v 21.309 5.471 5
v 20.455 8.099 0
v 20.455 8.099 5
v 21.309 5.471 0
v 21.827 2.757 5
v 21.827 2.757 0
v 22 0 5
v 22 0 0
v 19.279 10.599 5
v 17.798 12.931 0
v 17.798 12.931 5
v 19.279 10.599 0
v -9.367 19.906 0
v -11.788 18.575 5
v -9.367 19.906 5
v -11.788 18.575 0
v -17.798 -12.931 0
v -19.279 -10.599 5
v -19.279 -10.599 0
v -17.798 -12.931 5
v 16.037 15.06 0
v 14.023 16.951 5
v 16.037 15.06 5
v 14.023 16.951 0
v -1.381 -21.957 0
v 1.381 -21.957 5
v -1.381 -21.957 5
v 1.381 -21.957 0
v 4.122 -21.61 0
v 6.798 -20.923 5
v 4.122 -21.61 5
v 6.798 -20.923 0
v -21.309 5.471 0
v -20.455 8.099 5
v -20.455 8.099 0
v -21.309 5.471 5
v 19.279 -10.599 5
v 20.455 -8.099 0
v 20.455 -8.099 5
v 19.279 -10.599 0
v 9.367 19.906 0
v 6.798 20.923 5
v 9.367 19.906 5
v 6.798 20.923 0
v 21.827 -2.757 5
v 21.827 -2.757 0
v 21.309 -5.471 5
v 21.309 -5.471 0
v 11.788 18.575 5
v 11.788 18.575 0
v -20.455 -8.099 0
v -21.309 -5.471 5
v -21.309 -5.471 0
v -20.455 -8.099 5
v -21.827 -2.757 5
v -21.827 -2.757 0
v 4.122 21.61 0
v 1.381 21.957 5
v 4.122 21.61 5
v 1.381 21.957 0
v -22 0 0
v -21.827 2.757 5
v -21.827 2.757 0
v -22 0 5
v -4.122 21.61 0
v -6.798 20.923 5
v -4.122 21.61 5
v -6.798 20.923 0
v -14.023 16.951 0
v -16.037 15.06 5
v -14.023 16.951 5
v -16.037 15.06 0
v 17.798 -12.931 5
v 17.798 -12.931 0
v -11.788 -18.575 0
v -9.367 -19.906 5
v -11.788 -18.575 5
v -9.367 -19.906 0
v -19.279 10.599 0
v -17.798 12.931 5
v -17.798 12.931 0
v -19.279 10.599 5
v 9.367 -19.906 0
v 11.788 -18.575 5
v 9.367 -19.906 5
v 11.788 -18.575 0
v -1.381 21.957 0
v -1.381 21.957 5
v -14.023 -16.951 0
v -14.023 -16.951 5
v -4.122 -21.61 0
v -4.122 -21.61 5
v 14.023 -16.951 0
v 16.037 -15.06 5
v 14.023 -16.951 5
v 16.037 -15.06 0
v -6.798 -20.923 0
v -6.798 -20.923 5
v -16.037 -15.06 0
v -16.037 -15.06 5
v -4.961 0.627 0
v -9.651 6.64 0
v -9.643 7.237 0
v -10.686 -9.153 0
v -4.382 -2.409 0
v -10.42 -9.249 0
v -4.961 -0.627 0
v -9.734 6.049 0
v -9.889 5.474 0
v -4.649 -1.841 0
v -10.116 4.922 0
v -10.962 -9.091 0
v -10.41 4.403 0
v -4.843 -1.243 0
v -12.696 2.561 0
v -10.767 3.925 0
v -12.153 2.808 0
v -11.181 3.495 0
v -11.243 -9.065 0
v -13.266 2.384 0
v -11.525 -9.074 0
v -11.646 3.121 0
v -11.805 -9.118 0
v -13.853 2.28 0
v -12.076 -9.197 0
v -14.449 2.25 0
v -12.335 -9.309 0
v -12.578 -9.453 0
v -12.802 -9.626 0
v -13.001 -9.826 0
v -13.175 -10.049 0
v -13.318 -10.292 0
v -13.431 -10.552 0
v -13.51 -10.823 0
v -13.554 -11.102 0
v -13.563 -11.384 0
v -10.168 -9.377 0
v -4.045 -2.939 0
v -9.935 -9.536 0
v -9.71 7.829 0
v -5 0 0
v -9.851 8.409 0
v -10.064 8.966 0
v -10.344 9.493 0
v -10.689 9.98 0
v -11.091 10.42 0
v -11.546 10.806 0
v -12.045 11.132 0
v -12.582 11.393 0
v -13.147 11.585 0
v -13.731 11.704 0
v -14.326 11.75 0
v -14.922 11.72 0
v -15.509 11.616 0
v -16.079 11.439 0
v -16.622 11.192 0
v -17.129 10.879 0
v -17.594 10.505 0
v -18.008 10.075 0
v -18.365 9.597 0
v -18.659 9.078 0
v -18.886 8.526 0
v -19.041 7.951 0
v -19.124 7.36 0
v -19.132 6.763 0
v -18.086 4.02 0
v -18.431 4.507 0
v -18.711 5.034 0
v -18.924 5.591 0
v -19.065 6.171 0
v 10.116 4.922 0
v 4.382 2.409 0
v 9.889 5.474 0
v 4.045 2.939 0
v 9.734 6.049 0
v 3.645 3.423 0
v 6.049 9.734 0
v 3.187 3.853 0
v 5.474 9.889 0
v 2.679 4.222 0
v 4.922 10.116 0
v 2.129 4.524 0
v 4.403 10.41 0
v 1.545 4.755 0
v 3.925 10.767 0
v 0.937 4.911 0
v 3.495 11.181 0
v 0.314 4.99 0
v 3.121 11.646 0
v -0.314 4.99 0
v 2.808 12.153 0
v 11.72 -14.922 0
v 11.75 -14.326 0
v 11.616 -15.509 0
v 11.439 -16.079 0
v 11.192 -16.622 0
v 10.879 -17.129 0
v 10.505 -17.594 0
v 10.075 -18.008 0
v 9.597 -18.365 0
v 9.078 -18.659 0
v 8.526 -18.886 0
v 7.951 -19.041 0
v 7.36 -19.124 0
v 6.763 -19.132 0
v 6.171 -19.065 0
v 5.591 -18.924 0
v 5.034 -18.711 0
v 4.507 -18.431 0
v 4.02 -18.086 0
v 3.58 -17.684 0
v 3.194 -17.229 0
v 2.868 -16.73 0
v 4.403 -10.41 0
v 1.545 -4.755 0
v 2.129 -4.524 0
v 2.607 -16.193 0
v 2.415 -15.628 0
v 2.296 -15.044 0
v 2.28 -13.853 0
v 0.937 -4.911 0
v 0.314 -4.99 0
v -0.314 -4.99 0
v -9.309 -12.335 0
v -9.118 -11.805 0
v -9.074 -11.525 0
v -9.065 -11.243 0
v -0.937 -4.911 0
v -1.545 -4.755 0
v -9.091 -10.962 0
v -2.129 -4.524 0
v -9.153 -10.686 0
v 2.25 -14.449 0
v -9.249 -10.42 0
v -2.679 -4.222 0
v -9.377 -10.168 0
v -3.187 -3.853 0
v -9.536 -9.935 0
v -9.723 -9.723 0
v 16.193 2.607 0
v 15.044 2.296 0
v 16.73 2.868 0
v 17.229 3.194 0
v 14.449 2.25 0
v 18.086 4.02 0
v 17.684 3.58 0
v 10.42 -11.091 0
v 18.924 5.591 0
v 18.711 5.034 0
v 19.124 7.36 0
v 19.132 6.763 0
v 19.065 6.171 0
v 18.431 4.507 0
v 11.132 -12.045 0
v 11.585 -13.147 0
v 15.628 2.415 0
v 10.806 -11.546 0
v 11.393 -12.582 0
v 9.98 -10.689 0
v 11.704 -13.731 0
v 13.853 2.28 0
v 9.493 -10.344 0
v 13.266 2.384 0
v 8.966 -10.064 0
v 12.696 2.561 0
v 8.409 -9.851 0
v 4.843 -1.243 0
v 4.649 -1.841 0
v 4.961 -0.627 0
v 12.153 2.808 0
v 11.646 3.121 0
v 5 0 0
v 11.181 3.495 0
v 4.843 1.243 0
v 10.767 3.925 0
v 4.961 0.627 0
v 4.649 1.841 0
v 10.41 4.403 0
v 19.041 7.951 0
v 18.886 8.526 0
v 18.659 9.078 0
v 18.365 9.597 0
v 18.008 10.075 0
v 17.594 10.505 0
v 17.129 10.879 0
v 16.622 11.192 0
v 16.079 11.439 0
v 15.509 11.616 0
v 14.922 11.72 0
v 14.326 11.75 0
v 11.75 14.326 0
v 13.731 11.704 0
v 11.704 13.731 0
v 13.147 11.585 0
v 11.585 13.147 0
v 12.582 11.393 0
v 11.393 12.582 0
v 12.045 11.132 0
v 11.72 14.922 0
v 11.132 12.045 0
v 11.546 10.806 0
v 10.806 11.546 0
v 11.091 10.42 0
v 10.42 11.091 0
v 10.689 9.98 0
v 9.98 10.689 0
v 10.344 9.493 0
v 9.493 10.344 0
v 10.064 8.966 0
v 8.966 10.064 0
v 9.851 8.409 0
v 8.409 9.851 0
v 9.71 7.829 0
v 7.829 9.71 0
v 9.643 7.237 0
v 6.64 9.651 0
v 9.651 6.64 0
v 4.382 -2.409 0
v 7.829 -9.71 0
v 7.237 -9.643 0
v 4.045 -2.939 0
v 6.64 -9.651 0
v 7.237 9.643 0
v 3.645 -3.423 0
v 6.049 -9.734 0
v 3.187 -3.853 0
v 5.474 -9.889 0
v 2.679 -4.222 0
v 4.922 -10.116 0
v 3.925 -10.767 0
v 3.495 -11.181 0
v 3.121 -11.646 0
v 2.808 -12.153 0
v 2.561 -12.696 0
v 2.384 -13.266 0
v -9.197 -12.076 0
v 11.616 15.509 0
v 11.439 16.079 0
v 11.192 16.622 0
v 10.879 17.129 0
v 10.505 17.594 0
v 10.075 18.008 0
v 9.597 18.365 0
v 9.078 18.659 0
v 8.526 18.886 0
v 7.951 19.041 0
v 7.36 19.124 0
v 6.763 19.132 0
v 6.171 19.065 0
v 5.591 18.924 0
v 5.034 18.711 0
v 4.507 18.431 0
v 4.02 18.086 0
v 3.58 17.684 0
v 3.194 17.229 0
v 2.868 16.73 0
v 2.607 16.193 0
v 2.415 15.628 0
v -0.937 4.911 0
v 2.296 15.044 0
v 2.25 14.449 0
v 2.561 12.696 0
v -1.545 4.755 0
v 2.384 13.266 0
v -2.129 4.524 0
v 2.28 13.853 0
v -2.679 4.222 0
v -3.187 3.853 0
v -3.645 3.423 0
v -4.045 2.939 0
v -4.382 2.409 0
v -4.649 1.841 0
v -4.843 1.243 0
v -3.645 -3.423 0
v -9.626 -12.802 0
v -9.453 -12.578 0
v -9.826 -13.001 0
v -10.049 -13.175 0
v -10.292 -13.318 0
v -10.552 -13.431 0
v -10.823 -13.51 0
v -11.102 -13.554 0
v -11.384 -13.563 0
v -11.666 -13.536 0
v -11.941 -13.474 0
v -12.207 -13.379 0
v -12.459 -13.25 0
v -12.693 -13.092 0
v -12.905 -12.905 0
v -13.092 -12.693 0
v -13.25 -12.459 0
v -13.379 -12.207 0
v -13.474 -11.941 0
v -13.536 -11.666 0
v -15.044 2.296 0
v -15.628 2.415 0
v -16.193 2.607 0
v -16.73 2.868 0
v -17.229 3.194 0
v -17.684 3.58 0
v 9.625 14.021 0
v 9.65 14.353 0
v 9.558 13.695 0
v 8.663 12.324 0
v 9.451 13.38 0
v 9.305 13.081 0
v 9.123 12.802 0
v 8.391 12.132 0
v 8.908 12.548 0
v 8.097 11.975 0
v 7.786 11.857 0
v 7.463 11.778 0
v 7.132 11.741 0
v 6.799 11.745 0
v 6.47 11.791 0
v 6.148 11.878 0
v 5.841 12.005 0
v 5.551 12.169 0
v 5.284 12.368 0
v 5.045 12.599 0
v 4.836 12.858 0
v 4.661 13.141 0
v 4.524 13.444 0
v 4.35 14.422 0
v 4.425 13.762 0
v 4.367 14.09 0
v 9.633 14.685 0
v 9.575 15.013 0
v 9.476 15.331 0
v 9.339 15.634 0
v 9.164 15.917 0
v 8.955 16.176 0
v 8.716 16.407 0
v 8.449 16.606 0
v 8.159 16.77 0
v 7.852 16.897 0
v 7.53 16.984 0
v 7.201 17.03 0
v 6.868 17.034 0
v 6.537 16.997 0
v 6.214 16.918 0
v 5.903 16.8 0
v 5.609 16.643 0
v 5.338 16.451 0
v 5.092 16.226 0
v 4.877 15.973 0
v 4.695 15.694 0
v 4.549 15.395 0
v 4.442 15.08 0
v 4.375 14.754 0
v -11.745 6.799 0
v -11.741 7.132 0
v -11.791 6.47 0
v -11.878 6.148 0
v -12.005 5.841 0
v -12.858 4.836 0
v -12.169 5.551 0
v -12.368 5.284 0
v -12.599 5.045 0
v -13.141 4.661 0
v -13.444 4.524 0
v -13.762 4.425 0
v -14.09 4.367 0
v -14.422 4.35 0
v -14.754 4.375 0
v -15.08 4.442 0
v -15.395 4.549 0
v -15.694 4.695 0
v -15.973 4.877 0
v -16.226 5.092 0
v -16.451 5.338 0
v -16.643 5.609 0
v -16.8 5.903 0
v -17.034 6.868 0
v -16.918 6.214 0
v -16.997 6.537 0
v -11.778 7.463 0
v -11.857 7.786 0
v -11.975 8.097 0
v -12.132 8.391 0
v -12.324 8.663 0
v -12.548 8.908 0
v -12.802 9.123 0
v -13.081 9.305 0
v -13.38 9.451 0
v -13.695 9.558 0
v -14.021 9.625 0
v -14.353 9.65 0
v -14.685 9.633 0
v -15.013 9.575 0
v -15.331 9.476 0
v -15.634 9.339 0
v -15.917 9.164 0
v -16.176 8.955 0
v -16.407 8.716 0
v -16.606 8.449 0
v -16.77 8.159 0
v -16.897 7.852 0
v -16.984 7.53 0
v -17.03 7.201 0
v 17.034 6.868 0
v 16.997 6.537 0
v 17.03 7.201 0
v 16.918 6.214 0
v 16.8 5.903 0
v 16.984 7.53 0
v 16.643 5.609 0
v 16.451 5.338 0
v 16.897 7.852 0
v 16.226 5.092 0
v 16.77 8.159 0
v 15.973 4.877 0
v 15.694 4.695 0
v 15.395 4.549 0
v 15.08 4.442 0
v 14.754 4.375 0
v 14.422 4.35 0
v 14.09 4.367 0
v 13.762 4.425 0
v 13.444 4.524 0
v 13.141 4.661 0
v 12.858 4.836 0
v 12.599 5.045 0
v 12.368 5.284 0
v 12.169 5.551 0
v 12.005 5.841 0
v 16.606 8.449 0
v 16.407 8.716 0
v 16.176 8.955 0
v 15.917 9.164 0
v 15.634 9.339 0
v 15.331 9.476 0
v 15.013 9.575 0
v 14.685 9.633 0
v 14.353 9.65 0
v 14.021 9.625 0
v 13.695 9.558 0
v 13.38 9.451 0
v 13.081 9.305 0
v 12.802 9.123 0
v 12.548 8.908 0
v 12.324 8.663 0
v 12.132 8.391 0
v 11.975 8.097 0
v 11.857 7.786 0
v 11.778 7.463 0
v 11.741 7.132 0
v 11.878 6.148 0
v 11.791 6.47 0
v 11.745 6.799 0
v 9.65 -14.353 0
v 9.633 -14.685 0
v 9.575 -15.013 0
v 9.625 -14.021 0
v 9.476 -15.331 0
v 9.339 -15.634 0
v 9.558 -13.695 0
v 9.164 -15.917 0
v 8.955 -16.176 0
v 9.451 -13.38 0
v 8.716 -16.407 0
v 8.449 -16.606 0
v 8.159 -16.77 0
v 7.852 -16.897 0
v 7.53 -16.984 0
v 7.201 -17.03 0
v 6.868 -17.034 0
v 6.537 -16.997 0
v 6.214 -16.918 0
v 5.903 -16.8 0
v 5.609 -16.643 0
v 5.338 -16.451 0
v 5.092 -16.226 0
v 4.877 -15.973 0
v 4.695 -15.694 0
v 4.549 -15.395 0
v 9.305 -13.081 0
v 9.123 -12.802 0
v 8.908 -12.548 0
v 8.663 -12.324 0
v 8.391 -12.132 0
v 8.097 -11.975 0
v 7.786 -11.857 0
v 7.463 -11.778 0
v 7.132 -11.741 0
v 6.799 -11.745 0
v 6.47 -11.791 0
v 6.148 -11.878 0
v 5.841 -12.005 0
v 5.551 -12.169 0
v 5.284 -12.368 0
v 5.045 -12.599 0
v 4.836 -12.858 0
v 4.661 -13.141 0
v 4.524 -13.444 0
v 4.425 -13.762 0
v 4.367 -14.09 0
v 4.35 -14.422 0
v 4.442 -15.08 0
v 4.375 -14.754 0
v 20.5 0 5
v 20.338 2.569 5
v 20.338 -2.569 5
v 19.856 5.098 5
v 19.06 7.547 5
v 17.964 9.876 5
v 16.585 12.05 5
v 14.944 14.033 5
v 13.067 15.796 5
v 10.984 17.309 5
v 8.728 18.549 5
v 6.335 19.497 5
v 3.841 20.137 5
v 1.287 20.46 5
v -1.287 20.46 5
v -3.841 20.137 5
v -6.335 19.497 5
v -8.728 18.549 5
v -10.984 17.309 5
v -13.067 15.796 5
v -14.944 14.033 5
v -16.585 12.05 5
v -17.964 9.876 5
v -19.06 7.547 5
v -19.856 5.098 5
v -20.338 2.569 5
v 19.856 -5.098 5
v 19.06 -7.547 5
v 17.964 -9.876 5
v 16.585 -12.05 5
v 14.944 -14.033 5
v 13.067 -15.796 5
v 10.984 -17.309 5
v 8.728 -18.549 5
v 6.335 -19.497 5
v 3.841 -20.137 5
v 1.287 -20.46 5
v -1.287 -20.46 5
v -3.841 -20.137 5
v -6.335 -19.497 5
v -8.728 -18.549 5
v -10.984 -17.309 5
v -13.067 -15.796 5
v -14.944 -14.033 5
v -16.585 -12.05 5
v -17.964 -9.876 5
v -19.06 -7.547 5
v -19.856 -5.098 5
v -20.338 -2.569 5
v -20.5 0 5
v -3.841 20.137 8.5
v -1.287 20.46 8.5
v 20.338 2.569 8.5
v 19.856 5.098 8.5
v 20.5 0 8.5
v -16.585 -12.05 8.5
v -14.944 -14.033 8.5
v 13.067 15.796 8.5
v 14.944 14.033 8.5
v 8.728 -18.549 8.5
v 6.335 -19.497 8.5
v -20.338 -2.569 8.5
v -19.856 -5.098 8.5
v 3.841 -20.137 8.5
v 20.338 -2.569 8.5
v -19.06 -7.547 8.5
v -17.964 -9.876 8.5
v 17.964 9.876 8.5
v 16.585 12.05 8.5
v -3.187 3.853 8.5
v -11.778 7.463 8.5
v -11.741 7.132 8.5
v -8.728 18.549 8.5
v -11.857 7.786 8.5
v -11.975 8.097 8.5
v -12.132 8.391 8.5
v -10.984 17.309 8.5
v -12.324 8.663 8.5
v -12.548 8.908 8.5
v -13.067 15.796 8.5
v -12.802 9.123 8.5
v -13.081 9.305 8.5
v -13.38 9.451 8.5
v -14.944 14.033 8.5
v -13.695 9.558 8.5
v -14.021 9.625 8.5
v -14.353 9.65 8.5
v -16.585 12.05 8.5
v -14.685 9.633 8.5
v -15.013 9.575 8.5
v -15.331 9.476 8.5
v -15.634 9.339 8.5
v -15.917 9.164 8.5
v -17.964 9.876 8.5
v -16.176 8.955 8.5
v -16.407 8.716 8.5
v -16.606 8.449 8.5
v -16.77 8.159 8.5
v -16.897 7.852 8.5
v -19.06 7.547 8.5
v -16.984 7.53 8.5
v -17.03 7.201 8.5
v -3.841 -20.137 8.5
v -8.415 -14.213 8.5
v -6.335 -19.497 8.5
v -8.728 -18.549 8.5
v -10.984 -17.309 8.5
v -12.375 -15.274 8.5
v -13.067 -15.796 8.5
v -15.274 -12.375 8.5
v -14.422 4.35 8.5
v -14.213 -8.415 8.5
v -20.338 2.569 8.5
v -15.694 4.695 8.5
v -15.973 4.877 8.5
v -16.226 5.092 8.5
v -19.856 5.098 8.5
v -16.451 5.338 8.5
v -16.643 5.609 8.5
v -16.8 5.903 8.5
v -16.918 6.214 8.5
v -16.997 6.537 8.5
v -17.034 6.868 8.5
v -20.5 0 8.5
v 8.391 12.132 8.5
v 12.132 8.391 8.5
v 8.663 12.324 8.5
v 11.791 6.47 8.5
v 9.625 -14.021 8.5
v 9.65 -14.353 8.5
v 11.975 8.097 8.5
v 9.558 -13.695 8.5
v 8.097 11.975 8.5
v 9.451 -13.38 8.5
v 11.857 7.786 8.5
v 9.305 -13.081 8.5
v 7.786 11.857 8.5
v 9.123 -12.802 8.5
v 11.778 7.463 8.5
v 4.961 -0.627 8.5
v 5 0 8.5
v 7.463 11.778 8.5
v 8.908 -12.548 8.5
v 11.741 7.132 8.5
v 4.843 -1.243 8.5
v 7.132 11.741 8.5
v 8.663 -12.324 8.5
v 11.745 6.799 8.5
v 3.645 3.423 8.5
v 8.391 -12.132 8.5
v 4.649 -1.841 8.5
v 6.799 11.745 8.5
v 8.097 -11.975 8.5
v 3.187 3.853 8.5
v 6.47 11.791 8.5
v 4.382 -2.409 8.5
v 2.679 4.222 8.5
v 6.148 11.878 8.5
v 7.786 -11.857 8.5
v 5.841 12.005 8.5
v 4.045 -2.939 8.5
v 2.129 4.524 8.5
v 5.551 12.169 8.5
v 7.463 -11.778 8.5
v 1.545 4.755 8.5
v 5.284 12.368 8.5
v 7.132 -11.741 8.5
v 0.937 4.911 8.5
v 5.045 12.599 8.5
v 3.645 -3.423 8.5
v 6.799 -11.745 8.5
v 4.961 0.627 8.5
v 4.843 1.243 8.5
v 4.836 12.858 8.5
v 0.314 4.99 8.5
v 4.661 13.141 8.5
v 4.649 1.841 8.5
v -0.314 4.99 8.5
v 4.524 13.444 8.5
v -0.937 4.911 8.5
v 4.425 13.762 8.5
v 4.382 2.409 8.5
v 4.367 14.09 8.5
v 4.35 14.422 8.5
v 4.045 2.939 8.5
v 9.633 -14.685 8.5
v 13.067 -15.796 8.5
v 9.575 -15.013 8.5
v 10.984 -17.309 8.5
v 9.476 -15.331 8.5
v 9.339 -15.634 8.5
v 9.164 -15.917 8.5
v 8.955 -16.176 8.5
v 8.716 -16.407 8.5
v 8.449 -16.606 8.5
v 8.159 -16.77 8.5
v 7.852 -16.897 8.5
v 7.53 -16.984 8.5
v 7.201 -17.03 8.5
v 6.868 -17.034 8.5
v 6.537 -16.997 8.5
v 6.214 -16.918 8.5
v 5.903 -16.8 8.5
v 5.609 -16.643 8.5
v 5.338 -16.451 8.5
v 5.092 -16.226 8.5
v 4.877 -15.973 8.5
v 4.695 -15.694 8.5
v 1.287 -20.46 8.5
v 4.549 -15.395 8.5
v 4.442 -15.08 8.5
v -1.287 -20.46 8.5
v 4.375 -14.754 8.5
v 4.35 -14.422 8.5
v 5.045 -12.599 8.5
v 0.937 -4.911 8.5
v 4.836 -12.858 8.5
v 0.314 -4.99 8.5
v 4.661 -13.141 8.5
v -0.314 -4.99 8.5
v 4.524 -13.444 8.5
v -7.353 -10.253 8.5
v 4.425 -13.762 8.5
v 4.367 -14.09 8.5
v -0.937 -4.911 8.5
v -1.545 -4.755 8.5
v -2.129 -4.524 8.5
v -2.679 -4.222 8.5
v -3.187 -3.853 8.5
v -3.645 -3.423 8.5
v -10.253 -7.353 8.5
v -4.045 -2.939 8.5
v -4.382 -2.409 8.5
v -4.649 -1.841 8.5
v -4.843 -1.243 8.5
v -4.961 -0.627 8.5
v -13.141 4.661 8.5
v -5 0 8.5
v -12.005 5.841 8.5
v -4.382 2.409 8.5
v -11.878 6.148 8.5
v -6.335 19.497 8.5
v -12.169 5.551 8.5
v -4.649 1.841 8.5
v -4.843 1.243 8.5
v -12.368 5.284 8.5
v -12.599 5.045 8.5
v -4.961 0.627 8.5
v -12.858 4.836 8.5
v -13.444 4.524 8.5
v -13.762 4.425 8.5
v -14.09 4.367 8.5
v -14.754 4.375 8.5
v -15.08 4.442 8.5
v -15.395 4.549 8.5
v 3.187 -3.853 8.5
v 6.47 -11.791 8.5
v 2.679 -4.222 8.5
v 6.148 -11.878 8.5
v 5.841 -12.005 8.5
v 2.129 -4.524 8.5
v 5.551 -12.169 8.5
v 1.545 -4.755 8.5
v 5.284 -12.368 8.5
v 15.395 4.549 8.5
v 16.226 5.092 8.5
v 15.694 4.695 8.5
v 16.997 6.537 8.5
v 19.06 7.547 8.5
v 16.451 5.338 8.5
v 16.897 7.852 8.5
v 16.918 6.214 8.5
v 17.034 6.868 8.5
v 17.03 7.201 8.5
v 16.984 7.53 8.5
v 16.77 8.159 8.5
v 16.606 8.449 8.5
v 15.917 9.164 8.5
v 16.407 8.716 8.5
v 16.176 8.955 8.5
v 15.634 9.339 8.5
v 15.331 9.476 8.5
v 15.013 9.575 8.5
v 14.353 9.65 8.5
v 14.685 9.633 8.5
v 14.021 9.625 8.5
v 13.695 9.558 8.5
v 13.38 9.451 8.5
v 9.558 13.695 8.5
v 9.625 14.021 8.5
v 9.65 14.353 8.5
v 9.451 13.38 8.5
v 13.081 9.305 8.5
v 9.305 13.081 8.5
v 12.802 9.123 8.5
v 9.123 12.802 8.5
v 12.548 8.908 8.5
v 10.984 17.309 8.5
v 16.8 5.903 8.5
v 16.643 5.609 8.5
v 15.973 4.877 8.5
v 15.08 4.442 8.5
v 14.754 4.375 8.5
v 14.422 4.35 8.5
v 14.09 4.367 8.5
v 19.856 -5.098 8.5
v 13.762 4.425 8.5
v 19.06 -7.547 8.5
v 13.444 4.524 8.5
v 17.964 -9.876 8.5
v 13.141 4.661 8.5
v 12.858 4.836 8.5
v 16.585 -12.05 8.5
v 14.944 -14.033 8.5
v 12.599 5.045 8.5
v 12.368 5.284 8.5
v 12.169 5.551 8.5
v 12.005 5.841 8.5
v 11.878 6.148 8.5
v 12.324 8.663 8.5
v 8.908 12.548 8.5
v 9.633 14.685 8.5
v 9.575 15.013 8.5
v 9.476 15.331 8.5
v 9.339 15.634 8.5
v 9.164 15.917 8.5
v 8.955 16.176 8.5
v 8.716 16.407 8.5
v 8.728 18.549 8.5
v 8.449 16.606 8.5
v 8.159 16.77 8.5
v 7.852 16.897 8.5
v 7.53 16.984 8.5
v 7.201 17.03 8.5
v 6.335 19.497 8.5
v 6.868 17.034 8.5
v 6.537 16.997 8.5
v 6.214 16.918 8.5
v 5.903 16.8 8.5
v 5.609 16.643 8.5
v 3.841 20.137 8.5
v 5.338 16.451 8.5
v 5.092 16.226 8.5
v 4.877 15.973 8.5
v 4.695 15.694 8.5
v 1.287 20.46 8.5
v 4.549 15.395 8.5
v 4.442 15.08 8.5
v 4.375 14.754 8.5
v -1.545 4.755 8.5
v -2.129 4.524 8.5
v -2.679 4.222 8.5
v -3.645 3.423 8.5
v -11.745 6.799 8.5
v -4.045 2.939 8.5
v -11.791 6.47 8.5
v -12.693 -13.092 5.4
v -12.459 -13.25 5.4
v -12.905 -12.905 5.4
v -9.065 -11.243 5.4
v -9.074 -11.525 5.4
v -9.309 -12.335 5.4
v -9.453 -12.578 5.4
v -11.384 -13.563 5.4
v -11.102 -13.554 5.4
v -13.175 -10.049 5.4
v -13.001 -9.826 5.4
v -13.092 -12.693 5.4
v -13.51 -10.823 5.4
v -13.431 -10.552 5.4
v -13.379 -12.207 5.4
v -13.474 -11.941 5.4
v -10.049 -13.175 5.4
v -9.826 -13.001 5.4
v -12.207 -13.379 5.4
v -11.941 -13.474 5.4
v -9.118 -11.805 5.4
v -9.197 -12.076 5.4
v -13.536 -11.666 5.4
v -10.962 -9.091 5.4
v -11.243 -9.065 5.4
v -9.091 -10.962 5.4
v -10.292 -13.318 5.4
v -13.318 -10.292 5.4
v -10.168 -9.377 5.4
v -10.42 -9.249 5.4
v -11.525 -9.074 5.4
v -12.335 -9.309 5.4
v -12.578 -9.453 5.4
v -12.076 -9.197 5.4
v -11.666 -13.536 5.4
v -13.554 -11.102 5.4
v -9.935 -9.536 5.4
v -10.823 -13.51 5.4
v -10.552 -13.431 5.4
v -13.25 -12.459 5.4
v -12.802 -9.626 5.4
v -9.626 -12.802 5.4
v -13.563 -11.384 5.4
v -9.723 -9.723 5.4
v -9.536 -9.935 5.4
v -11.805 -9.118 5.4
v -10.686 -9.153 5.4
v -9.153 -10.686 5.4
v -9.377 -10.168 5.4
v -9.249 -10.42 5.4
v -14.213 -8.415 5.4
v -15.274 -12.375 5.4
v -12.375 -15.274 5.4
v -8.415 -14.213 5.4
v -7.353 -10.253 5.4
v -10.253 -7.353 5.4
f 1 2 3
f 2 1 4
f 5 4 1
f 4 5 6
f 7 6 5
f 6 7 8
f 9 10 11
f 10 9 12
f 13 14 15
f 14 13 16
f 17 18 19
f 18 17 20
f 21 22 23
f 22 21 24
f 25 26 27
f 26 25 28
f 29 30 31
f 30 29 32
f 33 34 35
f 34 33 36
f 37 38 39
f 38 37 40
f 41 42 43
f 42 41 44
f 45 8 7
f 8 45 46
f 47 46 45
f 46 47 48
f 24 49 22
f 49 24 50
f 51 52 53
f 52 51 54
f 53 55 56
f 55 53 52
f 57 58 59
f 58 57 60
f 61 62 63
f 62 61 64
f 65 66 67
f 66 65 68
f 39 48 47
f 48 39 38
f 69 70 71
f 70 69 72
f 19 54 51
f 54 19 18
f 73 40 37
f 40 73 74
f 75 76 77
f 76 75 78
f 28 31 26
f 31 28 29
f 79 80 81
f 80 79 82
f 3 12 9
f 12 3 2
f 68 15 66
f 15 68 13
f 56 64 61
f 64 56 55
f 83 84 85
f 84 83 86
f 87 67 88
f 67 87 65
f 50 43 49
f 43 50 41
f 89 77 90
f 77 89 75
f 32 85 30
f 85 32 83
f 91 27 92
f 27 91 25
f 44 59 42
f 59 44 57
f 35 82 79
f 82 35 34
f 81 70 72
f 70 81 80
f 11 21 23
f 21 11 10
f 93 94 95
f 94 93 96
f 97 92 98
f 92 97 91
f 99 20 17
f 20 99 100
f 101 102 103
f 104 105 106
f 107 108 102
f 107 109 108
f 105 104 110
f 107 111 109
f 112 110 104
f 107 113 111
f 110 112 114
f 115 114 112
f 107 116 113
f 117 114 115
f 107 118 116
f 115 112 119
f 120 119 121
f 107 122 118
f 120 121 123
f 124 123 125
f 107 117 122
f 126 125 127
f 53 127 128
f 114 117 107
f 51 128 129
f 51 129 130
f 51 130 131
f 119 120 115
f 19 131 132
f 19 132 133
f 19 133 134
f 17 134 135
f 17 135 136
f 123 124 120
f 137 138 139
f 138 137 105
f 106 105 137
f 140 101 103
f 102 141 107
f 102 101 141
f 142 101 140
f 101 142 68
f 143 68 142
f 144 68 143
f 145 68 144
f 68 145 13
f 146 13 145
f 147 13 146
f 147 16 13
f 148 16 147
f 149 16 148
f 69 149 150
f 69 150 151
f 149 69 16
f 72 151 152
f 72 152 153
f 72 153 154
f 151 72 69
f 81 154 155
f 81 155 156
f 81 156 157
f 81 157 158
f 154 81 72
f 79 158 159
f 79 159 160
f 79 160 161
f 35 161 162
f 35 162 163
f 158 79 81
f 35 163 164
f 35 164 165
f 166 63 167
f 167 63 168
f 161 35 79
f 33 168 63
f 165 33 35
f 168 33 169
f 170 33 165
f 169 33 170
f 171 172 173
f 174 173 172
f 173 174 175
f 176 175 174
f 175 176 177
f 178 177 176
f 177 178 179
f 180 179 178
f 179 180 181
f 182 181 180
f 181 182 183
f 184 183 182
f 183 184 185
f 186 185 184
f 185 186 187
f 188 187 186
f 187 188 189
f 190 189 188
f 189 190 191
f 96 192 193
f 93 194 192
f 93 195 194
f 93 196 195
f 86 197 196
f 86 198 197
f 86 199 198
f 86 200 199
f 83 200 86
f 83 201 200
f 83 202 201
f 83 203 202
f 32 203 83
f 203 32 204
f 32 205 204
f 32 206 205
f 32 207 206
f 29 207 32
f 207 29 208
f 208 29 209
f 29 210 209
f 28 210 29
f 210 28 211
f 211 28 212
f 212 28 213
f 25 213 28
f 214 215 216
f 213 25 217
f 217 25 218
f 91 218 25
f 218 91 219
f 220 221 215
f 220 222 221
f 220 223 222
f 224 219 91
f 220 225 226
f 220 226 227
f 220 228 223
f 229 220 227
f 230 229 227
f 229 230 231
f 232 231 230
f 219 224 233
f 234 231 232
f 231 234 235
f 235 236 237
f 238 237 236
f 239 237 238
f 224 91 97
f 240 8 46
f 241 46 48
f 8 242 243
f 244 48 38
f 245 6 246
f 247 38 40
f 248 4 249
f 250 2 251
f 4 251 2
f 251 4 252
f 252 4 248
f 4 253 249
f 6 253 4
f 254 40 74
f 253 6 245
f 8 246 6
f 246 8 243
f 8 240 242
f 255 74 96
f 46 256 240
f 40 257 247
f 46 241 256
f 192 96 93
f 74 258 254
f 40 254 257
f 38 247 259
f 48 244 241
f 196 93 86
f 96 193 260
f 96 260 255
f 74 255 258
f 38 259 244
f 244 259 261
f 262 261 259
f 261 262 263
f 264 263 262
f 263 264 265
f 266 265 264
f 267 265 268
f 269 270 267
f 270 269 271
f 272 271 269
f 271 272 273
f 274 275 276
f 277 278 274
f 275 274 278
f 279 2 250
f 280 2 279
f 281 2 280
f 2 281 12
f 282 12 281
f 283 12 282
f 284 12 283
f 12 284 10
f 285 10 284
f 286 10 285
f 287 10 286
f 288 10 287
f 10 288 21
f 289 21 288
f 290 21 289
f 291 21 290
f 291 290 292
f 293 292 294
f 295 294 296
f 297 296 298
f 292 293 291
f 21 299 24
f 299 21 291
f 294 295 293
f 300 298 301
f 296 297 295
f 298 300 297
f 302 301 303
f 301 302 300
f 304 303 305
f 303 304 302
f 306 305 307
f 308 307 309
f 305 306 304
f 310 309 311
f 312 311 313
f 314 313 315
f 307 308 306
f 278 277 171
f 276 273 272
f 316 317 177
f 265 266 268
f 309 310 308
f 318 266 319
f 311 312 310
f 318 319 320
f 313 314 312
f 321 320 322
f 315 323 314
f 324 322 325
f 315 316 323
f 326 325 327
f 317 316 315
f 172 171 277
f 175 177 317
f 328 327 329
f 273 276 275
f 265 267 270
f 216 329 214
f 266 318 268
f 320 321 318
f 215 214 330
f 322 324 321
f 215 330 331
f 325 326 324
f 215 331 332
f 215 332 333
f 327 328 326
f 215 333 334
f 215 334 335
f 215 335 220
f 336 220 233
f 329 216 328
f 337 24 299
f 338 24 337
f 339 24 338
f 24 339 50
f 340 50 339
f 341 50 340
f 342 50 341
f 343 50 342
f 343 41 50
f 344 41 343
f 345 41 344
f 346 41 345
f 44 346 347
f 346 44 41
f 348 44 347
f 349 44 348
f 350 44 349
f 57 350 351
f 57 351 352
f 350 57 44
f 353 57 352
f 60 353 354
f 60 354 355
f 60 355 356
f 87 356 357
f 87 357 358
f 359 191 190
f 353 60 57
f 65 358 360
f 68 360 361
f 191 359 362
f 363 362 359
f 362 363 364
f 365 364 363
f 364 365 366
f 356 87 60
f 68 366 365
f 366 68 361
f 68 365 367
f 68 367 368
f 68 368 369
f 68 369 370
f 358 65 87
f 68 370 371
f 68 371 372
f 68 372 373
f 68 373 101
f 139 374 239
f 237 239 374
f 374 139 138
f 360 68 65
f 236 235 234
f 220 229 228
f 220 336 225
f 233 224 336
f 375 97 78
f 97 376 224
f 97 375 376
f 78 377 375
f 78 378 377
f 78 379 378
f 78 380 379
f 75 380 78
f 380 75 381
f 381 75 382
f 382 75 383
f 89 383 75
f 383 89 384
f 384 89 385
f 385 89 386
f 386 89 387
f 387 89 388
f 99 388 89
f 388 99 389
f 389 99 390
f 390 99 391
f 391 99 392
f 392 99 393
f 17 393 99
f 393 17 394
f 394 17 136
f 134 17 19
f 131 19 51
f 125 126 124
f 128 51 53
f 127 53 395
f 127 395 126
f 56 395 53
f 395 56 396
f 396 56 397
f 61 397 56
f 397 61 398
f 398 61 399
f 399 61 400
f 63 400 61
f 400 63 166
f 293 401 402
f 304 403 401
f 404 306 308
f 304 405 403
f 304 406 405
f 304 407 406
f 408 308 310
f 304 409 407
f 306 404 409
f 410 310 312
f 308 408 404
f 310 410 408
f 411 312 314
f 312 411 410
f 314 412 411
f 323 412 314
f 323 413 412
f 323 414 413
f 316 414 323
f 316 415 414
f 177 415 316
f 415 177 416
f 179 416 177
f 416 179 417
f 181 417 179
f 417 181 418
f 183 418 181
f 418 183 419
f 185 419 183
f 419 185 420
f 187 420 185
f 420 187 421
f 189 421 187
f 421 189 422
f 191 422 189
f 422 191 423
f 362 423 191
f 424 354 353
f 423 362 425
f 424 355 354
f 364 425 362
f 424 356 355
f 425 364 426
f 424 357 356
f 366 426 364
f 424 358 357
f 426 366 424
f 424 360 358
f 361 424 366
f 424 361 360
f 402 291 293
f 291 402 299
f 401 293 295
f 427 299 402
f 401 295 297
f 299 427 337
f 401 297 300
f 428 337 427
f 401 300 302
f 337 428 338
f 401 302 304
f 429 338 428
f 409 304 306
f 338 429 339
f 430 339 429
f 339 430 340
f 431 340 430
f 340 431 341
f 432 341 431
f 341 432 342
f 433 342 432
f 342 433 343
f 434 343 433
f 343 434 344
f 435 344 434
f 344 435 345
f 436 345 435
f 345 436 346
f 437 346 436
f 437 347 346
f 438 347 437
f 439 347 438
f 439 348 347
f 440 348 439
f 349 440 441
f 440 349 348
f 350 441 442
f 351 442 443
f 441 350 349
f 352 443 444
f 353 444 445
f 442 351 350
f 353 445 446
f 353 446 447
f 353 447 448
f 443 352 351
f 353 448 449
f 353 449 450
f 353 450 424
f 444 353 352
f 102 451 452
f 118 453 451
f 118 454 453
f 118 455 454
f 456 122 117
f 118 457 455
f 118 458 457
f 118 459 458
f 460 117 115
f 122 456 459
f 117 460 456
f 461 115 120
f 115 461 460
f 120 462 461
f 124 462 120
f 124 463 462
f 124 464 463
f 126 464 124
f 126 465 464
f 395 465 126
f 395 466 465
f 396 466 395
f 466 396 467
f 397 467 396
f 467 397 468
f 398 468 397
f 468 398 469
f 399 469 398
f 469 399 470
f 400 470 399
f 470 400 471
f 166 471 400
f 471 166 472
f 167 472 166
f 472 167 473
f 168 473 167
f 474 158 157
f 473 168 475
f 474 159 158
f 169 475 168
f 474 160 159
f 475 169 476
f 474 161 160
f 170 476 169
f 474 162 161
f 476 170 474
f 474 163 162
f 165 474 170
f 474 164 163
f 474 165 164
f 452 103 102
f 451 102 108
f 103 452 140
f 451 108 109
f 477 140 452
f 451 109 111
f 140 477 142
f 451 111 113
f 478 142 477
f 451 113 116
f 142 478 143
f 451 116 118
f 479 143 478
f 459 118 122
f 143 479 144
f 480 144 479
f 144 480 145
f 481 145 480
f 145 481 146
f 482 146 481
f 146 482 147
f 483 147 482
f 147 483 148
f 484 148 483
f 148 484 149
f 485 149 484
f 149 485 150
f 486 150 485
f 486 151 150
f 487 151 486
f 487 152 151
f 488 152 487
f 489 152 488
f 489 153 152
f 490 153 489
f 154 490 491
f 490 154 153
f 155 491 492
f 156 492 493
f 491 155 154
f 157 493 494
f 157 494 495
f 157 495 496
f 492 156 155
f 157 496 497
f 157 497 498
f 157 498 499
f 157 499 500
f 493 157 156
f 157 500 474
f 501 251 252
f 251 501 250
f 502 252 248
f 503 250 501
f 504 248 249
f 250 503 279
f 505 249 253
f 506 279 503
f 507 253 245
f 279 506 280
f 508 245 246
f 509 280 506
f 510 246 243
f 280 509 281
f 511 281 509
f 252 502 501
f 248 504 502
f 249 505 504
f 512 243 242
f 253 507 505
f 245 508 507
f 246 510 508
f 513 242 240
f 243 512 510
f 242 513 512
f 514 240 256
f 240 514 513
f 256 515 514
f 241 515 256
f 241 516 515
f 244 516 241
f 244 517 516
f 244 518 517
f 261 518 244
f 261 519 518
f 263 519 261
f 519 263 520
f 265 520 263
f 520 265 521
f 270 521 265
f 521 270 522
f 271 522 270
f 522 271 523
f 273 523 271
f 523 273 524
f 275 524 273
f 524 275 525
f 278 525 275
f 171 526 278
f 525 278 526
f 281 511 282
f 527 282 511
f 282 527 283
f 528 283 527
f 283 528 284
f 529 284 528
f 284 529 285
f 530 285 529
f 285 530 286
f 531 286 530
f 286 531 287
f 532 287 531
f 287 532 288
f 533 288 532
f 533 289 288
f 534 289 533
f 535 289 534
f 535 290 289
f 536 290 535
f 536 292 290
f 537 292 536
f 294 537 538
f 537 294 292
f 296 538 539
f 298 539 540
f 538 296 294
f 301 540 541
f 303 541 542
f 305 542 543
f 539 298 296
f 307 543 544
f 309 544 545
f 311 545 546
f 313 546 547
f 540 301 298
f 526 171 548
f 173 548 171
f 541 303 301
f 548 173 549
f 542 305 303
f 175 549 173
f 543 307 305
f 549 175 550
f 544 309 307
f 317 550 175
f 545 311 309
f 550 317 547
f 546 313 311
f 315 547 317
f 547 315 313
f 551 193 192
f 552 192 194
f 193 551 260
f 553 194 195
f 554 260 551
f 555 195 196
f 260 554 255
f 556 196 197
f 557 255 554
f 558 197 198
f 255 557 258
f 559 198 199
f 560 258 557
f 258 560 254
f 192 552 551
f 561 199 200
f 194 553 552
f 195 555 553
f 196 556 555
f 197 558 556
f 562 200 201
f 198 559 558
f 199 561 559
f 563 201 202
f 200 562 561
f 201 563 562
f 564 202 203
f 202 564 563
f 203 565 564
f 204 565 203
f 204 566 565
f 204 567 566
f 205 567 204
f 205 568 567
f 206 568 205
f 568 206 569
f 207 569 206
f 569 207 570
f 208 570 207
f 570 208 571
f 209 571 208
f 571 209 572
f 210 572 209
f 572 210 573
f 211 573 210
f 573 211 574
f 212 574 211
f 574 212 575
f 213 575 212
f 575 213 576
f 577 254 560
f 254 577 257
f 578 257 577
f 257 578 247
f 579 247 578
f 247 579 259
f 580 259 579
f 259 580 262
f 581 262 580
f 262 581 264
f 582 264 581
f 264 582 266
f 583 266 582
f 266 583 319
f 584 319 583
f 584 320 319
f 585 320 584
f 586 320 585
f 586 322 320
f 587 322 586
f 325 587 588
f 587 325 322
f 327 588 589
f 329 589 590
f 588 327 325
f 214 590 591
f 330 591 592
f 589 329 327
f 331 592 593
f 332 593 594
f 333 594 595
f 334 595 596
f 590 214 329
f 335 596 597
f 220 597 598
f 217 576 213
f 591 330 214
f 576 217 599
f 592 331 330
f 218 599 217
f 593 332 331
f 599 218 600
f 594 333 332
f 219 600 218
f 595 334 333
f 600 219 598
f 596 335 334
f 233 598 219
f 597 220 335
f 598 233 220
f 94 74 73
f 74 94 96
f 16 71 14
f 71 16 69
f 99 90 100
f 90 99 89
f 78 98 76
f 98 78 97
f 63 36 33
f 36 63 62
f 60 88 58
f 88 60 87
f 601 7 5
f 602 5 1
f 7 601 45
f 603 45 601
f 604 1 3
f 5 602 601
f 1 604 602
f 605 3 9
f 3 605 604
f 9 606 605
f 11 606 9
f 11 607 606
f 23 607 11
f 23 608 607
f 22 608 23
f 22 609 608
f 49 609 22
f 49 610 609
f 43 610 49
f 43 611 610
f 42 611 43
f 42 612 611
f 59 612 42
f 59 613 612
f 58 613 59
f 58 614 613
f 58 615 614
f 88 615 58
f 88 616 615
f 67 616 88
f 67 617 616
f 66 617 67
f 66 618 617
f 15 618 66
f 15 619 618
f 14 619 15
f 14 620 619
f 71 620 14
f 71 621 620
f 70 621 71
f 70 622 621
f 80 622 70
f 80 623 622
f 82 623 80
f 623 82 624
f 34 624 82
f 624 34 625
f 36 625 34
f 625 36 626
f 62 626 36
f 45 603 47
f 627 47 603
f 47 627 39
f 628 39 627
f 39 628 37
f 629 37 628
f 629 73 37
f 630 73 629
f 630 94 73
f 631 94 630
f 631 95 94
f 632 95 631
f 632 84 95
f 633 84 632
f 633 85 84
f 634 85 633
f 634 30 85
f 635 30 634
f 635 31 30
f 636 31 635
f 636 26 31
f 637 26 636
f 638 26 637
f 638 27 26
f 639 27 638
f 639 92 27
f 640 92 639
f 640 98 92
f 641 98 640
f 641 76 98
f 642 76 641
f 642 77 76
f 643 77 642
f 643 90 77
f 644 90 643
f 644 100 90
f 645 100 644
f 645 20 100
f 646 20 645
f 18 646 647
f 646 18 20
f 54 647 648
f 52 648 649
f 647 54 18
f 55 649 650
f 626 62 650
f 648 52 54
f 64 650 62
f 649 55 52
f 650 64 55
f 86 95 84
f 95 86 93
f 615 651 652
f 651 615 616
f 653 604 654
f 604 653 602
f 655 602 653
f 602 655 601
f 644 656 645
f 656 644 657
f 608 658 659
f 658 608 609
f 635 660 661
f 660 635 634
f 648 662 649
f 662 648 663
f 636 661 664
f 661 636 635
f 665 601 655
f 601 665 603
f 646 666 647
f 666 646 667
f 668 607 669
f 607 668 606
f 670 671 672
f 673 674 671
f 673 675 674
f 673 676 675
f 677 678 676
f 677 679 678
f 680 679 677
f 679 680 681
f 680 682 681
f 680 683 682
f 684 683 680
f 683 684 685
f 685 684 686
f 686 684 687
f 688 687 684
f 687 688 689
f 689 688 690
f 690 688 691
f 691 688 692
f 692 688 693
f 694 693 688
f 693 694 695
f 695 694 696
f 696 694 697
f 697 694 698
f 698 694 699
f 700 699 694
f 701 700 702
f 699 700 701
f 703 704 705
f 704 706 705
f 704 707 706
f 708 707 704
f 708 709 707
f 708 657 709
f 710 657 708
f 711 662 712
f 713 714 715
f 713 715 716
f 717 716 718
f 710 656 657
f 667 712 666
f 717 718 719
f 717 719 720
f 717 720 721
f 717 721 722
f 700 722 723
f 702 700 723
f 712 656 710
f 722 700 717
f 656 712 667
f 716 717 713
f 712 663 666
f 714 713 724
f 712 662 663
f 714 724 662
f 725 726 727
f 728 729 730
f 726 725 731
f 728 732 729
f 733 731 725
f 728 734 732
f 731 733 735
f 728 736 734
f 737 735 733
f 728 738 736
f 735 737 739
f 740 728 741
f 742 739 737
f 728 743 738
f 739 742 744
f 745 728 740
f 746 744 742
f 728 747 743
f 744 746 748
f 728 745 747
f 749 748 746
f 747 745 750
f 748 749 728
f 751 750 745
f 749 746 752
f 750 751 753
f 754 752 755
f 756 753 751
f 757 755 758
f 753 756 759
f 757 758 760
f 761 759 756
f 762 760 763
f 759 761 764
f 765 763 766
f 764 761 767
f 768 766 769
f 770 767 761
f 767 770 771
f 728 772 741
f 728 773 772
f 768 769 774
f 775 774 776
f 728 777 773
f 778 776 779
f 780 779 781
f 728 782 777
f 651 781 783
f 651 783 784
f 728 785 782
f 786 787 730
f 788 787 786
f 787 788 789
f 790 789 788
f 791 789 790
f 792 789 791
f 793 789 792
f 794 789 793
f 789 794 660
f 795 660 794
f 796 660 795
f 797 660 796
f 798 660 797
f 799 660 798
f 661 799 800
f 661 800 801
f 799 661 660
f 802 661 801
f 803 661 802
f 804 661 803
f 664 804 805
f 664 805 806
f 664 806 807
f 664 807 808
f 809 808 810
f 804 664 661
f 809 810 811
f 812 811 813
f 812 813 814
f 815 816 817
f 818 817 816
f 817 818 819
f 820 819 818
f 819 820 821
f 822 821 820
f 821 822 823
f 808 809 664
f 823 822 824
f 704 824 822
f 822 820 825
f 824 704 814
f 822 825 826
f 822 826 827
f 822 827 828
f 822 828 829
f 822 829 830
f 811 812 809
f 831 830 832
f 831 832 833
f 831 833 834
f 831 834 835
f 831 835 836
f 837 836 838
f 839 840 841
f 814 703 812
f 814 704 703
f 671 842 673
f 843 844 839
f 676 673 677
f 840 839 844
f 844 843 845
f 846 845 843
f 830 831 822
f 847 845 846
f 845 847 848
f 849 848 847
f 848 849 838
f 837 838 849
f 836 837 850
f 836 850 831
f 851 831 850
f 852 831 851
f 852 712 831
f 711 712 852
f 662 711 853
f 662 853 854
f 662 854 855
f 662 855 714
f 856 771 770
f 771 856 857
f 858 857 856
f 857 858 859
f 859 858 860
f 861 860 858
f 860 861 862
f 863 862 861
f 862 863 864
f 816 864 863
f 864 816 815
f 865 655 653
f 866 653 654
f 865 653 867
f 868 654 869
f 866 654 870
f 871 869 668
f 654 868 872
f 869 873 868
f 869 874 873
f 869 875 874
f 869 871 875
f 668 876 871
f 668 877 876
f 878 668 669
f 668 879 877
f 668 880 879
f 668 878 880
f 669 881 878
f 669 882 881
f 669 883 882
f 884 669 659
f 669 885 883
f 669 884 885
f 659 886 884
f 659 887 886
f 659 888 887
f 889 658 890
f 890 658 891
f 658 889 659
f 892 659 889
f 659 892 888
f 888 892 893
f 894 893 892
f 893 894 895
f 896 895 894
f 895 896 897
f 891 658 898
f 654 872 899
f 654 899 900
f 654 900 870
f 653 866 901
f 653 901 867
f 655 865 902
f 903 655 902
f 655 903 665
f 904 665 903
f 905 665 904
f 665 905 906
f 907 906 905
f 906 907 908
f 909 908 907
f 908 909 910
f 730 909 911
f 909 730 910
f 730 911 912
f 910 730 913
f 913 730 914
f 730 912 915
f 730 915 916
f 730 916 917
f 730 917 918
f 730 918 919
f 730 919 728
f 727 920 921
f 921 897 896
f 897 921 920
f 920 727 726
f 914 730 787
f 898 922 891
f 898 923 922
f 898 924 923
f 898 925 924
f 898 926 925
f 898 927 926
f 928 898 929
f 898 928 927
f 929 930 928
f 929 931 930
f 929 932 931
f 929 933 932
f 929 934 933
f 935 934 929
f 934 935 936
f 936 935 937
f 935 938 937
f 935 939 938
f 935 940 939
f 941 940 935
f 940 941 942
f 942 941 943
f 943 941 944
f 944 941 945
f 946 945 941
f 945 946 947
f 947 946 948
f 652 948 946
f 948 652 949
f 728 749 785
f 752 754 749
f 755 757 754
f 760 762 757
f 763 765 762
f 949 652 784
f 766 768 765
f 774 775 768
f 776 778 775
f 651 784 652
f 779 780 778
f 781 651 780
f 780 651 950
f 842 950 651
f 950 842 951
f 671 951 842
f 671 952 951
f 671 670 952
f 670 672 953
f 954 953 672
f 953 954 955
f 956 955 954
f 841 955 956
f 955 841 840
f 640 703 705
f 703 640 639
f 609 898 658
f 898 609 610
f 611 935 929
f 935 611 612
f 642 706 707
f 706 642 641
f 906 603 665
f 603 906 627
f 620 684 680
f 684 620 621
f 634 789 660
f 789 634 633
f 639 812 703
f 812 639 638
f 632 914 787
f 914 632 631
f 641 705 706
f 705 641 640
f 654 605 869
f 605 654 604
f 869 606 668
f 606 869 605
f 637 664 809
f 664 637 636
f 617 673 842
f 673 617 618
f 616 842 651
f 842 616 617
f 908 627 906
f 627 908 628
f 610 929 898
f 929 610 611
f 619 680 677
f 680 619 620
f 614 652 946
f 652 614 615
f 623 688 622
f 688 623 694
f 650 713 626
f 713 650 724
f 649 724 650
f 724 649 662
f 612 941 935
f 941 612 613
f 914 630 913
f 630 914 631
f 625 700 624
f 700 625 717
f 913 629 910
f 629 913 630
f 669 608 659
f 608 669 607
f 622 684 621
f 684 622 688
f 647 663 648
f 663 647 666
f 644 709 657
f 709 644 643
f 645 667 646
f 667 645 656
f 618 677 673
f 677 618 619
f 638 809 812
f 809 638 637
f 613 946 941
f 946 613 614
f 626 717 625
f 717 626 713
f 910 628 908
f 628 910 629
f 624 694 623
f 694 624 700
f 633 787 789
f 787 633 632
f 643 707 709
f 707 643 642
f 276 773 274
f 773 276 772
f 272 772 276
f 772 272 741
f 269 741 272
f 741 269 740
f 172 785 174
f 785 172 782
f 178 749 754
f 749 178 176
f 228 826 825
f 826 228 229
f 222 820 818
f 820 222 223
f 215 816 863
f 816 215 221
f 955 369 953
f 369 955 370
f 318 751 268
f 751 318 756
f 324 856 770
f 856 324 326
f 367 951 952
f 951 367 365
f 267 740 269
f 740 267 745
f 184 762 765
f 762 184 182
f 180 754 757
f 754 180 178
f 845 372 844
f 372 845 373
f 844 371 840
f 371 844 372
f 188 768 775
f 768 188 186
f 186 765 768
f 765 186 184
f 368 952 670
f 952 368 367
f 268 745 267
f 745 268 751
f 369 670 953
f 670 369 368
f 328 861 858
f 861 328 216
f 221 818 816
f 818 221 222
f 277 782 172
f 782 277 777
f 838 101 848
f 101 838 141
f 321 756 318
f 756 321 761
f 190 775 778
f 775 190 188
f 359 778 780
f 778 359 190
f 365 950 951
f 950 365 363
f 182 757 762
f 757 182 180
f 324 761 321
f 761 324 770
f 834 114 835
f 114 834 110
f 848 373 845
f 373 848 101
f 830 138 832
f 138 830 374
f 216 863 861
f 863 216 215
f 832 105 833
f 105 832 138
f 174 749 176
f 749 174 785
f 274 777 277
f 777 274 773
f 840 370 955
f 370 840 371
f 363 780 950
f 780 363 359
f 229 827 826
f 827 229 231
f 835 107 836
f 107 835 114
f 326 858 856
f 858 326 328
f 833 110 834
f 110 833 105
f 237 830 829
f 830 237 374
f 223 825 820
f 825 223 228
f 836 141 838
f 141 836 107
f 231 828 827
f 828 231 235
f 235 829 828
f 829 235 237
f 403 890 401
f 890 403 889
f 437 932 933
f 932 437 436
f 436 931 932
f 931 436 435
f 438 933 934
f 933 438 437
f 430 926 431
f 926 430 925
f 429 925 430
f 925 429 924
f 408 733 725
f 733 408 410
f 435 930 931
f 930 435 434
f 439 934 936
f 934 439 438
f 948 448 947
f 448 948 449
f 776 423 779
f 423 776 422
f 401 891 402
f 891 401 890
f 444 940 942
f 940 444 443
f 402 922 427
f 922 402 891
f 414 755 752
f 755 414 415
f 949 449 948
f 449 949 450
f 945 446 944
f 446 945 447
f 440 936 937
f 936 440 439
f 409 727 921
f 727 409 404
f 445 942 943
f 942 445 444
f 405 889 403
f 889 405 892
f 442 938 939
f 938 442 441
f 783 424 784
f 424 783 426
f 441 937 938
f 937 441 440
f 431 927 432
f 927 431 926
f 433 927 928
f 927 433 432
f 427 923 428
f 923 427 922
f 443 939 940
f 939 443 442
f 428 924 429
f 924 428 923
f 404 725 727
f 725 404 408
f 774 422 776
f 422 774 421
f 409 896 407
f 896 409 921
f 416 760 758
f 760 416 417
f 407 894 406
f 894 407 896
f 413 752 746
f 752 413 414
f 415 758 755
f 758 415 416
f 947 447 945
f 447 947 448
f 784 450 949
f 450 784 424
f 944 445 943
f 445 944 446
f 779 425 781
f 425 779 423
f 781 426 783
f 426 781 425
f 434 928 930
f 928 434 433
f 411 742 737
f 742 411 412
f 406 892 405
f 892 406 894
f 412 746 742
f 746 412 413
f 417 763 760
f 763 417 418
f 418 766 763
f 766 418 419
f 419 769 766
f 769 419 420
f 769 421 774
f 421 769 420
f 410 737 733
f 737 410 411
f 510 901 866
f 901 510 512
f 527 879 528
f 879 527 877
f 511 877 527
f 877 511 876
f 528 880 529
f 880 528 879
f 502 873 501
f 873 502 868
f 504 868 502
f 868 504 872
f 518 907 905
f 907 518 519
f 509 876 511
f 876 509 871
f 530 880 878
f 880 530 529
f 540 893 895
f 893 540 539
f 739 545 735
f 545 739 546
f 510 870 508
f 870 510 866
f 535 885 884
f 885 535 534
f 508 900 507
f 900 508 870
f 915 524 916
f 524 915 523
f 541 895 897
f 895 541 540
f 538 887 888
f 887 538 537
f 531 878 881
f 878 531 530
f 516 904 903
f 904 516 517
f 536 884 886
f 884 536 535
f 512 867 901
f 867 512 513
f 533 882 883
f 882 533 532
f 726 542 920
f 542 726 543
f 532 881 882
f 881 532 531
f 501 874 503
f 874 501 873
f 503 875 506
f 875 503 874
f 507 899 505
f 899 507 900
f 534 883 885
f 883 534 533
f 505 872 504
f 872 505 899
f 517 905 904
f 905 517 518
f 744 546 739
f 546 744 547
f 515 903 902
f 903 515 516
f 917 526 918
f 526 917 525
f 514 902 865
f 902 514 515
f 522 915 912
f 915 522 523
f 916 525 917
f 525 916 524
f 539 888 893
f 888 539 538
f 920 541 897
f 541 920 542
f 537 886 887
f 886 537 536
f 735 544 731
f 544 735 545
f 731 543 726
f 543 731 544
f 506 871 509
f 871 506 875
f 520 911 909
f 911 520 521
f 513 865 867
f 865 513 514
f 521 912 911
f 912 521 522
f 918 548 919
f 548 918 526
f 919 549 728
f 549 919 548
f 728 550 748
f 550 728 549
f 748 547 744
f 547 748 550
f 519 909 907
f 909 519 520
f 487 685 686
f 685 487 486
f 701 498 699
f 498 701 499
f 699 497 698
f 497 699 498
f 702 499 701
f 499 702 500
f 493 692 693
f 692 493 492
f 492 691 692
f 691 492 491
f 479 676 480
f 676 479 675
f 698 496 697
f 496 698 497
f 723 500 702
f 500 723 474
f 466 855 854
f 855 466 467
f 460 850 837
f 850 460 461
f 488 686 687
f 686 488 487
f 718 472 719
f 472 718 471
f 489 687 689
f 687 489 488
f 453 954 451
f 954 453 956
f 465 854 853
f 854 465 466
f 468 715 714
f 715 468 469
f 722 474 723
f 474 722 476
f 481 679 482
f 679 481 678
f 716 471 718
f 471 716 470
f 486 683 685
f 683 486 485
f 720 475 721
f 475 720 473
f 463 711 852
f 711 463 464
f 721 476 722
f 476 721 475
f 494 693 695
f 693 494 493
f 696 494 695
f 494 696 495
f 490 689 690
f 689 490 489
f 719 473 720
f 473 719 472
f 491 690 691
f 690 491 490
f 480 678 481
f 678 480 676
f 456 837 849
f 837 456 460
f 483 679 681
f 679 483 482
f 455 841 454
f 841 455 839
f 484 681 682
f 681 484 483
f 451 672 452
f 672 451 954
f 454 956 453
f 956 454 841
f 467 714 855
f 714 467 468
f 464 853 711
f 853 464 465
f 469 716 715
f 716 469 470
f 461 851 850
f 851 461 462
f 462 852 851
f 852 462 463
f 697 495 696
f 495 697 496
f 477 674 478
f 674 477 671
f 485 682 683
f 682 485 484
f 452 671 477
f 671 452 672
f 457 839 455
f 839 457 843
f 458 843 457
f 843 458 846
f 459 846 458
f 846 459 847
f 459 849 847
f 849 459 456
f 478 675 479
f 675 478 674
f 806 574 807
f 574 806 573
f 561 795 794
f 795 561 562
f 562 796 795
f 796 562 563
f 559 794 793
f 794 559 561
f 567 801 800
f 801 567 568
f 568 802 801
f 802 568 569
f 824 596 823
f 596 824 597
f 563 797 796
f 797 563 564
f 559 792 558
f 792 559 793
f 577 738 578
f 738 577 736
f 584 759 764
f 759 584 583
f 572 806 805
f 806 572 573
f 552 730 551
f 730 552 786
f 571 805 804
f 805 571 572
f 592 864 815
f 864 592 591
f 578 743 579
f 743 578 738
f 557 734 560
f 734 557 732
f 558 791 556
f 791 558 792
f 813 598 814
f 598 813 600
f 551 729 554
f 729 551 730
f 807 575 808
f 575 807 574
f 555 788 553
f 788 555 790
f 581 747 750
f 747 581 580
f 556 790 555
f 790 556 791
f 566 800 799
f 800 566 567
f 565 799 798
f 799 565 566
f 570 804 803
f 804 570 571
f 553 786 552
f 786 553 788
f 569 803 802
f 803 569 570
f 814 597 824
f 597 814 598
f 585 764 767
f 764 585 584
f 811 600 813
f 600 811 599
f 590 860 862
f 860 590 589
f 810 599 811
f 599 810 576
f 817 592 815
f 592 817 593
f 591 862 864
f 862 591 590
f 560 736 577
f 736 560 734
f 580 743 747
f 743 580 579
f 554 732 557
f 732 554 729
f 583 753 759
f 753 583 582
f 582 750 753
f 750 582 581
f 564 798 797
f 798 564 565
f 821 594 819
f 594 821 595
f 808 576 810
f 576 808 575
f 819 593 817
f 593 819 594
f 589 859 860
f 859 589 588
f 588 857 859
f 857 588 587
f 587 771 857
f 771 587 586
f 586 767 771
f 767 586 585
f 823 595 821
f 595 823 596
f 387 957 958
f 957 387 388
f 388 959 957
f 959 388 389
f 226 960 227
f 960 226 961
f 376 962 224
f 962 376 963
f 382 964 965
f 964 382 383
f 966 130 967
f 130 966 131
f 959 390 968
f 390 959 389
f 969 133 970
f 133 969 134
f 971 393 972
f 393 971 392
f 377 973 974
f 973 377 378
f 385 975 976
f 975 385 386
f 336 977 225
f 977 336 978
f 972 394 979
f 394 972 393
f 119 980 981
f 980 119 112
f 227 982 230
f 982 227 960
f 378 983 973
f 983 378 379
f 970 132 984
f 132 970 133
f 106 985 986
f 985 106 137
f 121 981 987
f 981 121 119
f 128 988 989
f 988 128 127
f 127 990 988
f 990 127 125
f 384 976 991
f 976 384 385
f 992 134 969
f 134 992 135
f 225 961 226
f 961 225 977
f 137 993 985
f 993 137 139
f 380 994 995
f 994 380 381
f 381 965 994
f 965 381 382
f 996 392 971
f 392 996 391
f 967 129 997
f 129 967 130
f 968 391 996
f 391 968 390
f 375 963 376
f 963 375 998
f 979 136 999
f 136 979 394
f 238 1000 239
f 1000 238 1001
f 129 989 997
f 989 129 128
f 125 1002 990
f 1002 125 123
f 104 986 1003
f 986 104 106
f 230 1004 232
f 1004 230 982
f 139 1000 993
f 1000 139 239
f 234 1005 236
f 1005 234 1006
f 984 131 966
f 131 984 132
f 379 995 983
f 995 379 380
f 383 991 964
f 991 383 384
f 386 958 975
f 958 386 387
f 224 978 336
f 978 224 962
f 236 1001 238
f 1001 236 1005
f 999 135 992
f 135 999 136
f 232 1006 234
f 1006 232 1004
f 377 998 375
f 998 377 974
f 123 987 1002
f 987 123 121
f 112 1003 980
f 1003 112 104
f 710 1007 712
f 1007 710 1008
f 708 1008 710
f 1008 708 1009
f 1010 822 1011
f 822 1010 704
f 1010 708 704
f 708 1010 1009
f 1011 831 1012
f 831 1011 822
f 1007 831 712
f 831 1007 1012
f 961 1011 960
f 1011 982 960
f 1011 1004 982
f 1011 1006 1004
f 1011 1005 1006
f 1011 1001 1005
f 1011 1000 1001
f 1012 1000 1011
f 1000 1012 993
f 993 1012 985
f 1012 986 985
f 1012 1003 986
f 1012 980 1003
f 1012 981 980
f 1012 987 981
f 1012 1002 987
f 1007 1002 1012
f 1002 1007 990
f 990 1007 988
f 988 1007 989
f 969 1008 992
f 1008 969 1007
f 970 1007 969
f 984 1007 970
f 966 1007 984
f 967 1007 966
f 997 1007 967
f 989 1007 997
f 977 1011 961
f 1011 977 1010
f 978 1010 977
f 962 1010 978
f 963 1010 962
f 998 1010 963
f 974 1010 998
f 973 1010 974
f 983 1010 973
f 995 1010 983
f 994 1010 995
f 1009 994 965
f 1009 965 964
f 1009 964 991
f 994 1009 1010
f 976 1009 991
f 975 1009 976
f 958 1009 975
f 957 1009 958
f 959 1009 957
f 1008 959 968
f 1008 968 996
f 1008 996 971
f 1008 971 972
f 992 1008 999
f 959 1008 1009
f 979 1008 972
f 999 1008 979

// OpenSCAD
margen_error=0.5;

//Remache
radio_cuerpo=2.4+(margen_error/2);
alto_cuerpo=12.5;
alto_cabeza=2;
radio_cabeza=4.5+(margen_error/2);

//Tuercas M4 
radio_tuercas_M4=3.85+(margen_error/2);
alto_tuerca_M4=3.1;
//alto_hexagono_tuerca_ciega_M4=5.5;
alto_hexagono_tuerca_ciega_M4=4.5;
radio_tornillo_M4=2+(margen_error/2);

radio_exterior_cabezal=22;
radio_interior_cabezal=20.5;
alto_exterior_cabezal=5;
alto_interior_cabezal=3.5;
alto_total_cabezal=alto_exterior_cabezal+alto_interior_cabezal;

radio_ubicacion_electrodos=16; //Radio en el que van a estar los electrodos respecto del centro del cabezal
separacion_electrodo=7; //Distancia más chica de un electrodo al eje. Poner en 0 para electrodos sobre los ejes
angulo_RL=225;

radio_microfono=5;
alto_microfono=10;
radio_cable_microfono=2.5;

/*
echo("Diametro tuercas",radio_tuercas*2);
*/
module tuerca_M4(){
    cylinder(r=radio_tornillo_M4, h=alto_total_cabezal, $fn=50);
    rotate([0, 0, 30])
        translate([0, 0, alto_total_cabezal-alto_tuerca_M4])
            cylinder(r=radio_tuercas_M4, h=alto_tuerca_M4, $fn=6);
}

module electrodo_M4(){
    rotate([180, 0, 30])
        translate([0, 0, -alto_hexagono_tuerca_ciega_M4])
            tuerca_ciega_M4();
            tuerca_M4();
    tornillo_M4();
}


module remache(){
    cylinder(r=radio_cuerpo, h=alto_cuerpo, $fn=50);
    rotate([180, 0, 0])
            cylinder(r1=radio_cabeza, r2=0, h=alto_cabeza, $fn=50);
}


module microfono(){
    cylinder(r=radio_microfono, h=alto_microfono, $fn=50);
    cylinder(r=radio_cable_microfono, h=alto_total_cabezal, $fn=50);
}


module cabezal(){
    cylinder(r=radio_exterior_cabezal, h=alto_exterior_cabezal, $fn=50);
    translate([0, 0, alto_exterior_cabezal])
        cylinder(r=radio_interior_cabezal, h=alto_interior_cabezal, $fn=50);
}

/*
module grupo_de_electrodos_M4(){
    angulo_electrodo=90;//Electrodos a 90 grados
    //angulo_electrodo=120;//Electrodos a 60 grados
    for(i=[0,-angulo_electrodo, +angulo_electrodo]){
        rotate([0, 0, i])
            translate([radio_ubicacion_electrodos, 0, 0])
               electrodo_M4();
    }
}
*/
//!grupo_de_electrodos_M4();
module grupo_de_electrodos(){
    angulo_electrodo=acos(separacion_electrodo/radio_ubicacion_electrodos);
    for(i=[angulo_electrodo,90-angulo_electrodo, 90+angulo_electrodo, 360-angulo_electrodo]){
    //for(i=[angulo_electrodo,90-angulo_electrodo, 90+angulo_electrodo, 360-angulo_electrodo, angulo_RL]){
        rotate([0, 0, i])
            translate([radio_ubicacion_electrodos, 0, 0])
               remache();
    }
}

difference(){
    cabezal();
    microfono();
    #grupo_de_electrodos();
    rotate([0, 0, angulo_RL])
        //translate([-((radio_exterior_cabezal-radio_microfono)/2+radio_microfono), 0, -alto_cilindro_cabeza_bulon])
        translate([radio_ubicacion_electrodos, 0, 0])
            tuerca_M4();
}
